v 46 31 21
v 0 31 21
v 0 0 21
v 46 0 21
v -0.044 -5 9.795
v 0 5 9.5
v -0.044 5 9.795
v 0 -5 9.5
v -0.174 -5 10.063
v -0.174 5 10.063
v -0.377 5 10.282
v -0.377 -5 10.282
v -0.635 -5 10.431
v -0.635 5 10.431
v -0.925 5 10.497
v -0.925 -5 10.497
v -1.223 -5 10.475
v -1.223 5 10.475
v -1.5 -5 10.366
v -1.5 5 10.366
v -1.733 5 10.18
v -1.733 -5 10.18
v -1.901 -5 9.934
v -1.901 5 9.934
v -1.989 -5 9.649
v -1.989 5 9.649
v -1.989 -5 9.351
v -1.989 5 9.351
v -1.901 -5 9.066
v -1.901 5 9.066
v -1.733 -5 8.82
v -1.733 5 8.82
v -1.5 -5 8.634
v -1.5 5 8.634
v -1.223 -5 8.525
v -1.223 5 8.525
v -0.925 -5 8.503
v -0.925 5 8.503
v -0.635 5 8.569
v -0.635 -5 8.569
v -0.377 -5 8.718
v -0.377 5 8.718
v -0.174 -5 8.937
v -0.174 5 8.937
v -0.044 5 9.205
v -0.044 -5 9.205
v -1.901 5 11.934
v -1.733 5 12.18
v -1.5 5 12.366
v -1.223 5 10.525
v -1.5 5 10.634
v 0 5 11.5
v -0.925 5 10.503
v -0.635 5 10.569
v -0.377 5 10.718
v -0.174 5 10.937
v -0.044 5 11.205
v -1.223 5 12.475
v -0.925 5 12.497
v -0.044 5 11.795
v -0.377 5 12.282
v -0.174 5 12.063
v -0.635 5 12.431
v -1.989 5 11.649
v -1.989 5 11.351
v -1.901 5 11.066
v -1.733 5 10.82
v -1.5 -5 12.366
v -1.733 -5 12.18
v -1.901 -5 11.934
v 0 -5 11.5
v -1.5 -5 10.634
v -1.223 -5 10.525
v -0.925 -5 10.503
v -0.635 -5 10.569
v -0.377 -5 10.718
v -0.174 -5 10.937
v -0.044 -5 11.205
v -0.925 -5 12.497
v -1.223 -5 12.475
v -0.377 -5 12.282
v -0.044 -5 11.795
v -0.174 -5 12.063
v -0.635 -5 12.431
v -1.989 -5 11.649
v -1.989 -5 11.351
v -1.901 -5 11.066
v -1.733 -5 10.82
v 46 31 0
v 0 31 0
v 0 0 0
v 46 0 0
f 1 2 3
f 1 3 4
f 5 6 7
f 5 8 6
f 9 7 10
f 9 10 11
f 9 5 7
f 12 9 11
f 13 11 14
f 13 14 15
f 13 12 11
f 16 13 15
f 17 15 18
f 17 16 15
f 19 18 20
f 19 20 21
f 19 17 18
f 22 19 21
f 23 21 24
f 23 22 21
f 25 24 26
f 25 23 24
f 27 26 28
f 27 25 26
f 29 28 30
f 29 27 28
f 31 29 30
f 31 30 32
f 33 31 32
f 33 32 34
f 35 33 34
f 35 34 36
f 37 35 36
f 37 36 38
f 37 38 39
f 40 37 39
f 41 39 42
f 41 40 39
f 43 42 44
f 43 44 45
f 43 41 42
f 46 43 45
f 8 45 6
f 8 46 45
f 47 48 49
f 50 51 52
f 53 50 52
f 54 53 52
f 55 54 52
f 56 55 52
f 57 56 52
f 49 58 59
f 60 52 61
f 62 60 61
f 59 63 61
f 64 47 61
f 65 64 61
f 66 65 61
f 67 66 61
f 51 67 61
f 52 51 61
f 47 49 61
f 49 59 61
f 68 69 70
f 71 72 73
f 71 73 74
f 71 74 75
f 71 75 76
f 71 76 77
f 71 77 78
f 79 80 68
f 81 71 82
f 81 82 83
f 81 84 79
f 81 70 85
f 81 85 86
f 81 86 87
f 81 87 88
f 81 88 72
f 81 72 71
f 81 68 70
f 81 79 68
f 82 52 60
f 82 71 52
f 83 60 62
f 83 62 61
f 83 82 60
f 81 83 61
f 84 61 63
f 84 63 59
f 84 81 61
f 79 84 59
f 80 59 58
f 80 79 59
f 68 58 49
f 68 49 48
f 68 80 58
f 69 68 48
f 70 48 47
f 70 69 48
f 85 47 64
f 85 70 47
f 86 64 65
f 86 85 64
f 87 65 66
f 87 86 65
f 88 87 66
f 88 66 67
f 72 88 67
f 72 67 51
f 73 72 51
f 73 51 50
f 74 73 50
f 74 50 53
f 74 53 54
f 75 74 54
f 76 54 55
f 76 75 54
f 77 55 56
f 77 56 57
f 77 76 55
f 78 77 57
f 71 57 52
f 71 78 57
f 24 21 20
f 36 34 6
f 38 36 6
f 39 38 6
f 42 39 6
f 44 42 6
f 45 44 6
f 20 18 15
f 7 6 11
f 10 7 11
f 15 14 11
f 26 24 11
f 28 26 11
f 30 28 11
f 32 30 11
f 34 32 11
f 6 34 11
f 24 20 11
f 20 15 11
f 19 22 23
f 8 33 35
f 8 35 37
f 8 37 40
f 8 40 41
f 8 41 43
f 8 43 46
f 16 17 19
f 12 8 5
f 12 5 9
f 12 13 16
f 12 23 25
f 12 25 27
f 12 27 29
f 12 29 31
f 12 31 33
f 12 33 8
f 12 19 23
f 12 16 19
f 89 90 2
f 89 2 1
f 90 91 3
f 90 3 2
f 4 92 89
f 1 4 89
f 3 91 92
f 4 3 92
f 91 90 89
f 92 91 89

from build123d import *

# Parameters (mm, degrees)
SKETCH_1_W             = 46
SKETCH_1_H             = 31
EXTRUDE_1_DEPTH        = 21
SKETCH_2_R             = 1
EXTRUDE_2_DEPTH        = 5
EXTRUDE_2_DEPTH_BACK   = 5
EXTRUDE_2_2_DEPTH      = 5
EXTRUDE_2_2_DEPTH_BACK = 5


with BuildPart() as part:
    # ｽｹｯﾁ1 → ﾎﾞｽ - 押し出し1 (new body)
    with BuildSketch(Plane.XY):
        with Locations((23, 15.5)):
            Rectangle(SKETCH_1_W, SKETCH_1_H)
    extrude(amount=EXTRUDE_1_DEPTH)


with BuildPart() as body_2:
    # ｽｹｯﾁ2 → ﾎﾞｽ - 押し出し2 (new body, two sides)
    with BuildSketch(Plane.XZ) as extrude_2_sk:
        with Locations((-1, 11.5)):
            Circle(SKETCH_2_R)
    extrude(amount=EXTRUDE_2_DEPTH)
    extrude(extrude_2_sk.sketch, amount=-EXTRUDE_2_DEPTH_BACK)


with BuildPart() as body_3:
    # ｽｹｯﾁ2 → Extrude 2 2 (new body, two sides)
    with BuildSketch(Plane.XZ) as extrude_2_2_sk:
        with Locations((-1, 9.5)):
            Circle(SKETCH_2_R)
    extrude(amount=EXTRUDE_2_2_DEPTH)
    extrude(extrude_2_2_sk.sketch, amount=-EXTRUDE_2_2_DEPTH_BACK)


solid = Compound([part.part, body_2.part, body_3.part])
